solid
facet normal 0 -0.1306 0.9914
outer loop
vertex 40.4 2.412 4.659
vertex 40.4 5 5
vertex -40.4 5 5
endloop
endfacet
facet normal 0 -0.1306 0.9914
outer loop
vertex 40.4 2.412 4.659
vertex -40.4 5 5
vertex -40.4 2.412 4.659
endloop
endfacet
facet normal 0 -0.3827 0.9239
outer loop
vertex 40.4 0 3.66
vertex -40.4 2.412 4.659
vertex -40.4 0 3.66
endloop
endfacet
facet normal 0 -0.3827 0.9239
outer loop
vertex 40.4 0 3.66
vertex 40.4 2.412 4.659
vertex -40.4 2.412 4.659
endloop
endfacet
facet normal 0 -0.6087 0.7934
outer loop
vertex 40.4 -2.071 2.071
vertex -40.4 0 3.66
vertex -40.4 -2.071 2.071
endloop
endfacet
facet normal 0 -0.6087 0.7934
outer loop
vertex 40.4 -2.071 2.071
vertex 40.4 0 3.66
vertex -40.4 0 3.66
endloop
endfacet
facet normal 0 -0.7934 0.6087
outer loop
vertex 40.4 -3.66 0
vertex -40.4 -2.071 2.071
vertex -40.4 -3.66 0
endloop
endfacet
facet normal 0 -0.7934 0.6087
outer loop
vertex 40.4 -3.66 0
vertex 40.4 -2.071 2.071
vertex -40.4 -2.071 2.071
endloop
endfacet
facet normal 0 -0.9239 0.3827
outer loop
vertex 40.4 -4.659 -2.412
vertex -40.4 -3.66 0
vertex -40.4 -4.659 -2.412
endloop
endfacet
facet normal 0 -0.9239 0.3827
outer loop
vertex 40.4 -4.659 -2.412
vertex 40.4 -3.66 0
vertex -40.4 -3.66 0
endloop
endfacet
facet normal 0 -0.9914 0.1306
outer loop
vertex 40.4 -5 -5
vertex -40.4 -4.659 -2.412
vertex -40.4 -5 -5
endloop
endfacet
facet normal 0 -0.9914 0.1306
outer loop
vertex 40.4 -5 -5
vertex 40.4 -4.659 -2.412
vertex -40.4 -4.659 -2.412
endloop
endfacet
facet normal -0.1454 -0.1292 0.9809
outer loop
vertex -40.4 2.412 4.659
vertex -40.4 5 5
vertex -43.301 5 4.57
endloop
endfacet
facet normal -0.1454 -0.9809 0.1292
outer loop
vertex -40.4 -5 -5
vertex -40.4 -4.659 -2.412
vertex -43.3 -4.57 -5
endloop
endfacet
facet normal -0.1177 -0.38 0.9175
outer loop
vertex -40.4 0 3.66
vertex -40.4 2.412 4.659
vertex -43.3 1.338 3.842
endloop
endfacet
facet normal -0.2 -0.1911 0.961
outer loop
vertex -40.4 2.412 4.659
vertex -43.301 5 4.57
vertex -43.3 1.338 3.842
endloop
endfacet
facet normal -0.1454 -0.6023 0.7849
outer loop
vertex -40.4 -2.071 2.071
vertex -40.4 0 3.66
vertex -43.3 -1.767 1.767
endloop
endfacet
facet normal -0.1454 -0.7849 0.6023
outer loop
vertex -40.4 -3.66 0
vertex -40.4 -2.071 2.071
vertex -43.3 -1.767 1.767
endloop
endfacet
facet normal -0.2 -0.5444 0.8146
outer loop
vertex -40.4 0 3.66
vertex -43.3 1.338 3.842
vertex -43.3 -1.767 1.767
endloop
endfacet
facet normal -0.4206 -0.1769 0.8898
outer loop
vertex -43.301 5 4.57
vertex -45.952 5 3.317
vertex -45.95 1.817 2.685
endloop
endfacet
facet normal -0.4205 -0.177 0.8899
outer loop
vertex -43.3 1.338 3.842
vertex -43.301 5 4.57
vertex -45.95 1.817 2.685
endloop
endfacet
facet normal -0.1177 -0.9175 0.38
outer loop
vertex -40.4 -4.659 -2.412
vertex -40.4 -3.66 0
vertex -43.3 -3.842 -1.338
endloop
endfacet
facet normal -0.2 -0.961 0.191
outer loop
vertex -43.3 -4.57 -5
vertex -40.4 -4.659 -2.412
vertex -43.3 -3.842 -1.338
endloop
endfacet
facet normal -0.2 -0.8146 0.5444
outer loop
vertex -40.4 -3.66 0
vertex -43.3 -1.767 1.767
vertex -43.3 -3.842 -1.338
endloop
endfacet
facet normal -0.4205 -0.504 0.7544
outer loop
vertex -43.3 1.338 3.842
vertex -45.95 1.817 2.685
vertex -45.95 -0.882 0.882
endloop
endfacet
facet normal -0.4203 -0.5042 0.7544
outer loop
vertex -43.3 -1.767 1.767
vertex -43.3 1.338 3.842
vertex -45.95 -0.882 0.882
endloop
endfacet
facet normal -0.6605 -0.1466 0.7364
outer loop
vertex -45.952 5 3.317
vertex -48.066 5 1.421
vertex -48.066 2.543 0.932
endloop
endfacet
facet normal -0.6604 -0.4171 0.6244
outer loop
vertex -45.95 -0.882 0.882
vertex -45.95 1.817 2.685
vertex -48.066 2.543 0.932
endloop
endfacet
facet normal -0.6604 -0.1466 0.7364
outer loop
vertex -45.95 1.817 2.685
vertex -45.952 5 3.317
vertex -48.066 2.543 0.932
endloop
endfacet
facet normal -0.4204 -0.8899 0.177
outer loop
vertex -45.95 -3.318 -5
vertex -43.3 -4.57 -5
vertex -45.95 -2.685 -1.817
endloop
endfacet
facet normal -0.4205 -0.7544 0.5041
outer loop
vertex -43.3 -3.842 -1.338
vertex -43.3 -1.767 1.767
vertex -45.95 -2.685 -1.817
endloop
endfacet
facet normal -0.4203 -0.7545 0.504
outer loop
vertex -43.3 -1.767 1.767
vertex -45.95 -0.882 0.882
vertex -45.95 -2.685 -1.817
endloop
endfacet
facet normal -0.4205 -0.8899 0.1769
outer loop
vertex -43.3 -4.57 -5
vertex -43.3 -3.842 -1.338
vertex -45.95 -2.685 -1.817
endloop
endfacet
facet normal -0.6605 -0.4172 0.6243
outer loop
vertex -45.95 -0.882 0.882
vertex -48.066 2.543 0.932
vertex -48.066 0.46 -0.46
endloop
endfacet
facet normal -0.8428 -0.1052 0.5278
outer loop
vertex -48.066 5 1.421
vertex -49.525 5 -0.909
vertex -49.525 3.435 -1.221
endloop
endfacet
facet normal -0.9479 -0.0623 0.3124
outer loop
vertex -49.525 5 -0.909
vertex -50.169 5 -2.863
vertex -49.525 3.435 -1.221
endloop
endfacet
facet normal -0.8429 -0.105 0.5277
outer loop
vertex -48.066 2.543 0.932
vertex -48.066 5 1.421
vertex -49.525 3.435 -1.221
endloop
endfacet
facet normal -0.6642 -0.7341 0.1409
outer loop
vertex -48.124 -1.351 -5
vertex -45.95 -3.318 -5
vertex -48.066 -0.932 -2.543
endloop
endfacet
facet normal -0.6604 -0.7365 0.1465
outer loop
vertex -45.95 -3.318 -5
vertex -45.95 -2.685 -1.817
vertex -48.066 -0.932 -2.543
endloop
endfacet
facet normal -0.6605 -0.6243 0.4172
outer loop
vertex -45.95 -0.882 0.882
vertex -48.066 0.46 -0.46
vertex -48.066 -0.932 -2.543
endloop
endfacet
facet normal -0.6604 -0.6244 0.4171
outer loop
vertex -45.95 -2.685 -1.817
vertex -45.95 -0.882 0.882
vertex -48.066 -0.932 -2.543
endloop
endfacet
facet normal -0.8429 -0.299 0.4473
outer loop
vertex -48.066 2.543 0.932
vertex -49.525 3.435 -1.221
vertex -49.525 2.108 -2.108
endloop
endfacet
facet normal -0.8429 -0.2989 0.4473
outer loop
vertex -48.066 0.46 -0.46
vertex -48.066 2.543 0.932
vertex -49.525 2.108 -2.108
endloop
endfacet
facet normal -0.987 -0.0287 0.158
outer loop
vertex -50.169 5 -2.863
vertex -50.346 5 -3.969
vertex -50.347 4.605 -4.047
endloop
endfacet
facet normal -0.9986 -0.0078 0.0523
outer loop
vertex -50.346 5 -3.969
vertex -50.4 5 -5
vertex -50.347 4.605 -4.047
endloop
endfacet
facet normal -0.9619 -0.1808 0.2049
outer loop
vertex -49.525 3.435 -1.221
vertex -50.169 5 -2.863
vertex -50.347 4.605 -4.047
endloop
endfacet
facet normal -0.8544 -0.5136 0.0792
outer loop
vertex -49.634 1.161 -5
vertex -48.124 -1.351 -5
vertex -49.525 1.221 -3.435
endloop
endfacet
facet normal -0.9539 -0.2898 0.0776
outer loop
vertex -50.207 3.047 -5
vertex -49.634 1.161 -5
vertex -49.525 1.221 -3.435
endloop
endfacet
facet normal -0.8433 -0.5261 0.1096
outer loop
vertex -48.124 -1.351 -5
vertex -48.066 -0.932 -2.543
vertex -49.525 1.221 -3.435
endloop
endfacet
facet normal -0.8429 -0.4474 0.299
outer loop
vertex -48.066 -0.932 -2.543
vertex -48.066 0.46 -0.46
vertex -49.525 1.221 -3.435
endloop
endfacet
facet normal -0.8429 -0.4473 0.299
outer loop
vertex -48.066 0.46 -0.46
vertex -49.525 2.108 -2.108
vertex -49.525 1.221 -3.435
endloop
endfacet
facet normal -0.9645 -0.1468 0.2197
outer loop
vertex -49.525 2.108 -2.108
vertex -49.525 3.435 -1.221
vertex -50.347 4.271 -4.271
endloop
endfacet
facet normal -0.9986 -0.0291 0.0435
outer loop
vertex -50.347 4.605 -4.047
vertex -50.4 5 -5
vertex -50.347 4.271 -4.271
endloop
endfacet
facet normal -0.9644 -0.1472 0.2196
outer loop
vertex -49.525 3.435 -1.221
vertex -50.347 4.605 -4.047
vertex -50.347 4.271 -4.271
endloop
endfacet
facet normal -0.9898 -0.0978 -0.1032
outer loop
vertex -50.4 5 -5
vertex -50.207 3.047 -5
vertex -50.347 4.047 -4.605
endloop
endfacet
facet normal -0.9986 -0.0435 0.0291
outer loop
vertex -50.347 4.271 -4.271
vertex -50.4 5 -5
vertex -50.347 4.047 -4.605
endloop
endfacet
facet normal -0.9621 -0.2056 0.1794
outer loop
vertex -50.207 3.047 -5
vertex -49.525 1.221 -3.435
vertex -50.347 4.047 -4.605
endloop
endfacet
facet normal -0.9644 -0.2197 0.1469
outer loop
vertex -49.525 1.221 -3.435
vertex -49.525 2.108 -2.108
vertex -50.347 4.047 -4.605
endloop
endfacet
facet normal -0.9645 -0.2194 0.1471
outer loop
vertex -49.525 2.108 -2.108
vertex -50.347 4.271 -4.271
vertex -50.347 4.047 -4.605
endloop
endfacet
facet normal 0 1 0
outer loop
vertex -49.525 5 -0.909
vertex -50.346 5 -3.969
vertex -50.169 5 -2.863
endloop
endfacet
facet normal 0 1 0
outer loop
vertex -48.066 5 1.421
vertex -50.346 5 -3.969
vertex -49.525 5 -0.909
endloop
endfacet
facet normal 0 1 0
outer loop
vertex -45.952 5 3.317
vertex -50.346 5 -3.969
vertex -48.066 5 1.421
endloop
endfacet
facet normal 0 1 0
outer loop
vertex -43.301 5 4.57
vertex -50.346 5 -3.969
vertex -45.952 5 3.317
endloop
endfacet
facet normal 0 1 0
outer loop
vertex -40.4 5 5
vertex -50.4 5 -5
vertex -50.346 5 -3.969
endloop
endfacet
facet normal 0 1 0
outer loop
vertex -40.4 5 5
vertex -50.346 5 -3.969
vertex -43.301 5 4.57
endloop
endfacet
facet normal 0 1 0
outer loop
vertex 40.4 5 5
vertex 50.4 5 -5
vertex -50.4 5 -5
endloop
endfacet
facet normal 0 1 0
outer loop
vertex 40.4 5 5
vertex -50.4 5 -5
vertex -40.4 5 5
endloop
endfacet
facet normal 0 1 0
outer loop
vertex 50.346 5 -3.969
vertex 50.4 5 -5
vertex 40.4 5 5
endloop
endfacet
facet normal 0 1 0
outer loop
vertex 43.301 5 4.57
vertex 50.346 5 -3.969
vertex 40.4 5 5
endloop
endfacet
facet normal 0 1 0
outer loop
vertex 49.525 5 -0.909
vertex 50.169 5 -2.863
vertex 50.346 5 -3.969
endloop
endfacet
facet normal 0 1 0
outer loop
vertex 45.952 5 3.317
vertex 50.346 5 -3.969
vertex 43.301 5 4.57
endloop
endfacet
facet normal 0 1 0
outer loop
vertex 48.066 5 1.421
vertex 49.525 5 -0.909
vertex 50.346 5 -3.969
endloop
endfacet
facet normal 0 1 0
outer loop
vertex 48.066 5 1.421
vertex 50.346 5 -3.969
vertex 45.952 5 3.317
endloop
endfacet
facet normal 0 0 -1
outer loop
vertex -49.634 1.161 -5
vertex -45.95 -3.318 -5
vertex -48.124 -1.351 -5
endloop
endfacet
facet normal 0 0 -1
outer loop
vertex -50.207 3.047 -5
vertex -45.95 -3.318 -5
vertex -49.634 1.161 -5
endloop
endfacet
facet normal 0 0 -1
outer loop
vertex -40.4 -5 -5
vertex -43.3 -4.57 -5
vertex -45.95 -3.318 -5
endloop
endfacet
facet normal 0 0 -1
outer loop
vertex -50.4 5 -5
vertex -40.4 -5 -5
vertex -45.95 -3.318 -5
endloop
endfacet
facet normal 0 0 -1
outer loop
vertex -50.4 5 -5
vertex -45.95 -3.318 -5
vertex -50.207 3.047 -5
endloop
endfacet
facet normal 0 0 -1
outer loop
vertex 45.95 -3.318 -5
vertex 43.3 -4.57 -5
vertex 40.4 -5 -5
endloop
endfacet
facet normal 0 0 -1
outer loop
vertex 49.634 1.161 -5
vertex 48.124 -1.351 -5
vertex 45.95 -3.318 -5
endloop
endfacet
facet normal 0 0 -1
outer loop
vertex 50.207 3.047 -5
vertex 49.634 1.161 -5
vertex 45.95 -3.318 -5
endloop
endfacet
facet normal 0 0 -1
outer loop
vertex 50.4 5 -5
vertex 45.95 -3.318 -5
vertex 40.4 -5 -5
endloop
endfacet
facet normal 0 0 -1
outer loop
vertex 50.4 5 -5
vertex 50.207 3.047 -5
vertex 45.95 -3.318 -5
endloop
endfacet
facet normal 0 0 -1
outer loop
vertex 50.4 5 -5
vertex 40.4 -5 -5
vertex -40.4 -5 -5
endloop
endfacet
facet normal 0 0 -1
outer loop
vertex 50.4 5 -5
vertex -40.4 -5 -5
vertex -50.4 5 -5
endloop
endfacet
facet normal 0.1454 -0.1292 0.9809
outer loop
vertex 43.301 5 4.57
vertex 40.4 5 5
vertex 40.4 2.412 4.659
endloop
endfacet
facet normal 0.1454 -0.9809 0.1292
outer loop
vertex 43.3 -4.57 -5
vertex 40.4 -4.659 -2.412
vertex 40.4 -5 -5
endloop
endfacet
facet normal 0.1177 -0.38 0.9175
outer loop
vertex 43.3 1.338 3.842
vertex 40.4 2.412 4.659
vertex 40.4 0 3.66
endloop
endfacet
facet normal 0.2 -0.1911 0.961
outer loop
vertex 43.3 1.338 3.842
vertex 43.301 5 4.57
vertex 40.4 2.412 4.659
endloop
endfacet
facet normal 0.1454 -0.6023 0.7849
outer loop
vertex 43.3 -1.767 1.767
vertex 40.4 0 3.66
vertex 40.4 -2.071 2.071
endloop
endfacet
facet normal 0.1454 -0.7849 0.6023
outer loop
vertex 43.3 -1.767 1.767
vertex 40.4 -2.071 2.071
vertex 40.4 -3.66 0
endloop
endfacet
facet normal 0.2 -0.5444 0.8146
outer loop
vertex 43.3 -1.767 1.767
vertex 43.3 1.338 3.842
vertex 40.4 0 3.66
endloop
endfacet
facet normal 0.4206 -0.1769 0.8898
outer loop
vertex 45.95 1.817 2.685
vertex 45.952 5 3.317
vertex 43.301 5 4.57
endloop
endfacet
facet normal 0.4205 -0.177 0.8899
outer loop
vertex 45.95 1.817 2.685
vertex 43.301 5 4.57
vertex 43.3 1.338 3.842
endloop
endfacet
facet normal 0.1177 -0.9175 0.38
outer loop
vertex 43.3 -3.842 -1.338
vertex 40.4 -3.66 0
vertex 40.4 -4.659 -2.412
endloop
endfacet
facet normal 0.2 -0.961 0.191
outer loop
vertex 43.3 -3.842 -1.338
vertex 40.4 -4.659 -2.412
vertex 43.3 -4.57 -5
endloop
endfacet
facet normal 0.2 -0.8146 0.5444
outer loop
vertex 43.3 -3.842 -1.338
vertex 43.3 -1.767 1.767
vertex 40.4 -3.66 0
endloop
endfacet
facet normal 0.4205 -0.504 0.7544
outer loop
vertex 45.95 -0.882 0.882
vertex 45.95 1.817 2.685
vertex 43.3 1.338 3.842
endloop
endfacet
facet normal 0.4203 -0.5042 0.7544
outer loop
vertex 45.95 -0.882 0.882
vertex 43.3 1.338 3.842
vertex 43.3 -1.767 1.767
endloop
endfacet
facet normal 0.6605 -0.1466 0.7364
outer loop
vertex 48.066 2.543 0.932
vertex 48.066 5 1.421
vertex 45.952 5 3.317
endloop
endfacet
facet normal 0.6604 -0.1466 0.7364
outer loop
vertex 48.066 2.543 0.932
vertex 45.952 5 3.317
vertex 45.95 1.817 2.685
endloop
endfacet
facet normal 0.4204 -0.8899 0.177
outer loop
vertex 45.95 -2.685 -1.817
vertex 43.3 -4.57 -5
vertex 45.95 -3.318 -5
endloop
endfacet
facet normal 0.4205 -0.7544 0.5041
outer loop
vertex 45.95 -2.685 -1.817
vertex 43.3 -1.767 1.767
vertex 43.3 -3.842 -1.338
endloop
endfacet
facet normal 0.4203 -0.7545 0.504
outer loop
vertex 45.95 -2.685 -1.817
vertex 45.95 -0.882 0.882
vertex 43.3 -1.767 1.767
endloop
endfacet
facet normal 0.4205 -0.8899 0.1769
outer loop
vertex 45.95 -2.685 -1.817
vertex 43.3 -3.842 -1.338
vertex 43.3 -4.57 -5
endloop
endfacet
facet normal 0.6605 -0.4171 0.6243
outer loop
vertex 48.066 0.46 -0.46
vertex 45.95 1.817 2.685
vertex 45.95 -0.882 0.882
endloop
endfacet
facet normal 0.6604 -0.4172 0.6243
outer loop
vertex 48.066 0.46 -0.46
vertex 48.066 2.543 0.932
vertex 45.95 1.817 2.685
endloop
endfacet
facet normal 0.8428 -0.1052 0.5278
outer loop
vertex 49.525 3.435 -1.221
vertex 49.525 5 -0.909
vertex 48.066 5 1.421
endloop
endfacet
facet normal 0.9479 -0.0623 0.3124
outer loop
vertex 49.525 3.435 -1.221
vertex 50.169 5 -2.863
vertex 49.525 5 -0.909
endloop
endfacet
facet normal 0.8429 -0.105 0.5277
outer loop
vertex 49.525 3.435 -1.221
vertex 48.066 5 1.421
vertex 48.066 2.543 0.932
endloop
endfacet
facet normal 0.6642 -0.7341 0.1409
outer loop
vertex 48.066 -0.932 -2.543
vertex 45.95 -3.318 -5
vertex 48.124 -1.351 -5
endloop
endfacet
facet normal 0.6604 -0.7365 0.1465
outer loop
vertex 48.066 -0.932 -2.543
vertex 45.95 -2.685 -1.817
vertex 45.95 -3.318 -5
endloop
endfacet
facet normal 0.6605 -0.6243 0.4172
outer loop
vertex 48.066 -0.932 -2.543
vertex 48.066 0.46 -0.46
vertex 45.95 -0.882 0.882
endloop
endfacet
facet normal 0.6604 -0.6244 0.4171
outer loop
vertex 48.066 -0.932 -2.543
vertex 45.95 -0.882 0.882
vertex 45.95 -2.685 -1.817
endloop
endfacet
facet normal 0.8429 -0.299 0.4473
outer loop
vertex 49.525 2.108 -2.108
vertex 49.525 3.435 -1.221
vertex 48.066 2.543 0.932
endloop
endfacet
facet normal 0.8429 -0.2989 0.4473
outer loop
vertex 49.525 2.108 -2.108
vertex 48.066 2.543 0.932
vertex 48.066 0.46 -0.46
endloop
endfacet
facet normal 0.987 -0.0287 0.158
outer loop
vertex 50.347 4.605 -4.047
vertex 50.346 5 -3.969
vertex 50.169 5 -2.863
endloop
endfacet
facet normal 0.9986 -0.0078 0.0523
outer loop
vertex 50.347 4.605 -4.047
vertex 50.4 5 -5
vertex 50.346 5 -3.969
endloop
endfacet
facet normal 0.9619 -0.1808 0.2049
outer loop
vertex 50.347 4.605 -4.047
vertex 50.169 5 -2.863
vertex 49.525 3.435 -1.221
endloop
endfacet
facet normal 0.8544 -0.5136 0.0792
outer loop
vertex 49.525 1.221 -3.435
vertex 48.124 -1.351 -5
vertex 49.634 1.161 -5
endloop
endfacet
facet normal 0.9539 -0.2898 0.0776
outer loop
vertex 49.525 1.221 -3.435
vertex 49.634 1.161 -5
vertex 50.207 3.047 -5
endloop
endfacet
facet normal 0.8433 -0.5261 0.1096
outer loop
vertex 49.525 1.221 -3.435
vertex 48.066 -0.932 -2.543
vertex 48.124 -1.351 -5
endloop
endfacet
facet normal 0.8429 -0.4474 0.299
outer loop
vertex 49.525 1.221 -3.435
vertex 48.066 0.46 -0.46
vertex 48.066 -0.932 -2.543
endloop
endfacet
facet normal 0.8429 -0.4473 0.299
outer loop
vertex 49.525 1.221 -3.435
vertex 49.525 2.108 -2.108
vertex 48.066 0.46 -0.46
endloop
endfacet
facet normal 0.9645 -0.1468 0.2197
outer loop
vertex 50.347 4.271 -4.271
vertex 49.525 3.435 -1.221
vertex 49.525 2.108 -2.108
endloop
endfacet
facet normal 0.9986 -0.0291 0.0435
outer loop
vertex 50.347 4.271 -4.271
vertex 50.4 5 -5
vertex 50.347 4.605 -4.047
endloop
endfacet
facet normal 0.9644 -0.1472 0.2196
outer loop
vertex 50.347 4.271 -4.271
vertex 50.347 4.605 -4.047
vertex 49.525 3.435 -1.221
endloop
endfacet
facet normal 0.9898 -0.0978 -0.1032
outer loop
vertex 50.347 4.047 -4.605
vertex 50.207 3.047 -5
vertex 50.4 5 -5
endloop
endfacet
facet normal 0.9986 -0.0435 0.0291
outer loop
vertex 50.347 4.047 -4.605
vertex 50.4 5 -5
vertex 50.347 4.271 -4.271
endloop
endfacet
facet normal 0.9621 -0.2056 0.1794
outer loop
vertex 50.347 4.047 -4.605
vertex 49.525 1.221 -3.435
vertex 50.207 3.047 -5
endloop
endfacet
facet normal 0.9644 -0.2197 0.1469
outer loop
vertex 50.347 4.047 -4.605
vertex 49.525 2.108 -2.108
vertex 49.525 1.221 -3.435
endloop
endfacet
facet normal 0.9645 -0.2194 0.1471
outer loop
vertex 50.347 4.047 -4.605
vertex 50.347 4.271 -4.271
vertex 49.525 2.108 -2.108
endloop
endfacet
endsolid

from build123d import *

# Parameters (mm, degrees)
F1_DEPTH = 50.4
F2_R     = 9.99999


# Not quite as in the source:
# - a fillet or chamfer is up to 0.001 mm smaller than in the source, because OpenCascade refuses the exact size


with BuildPart() as f1:
    # F0 (on Right) → F1 (new body, symmetric)
    with BuildSketch(Plane.YZ):
        with BuildLine():
            Line((-5, -5), (5, -5))
            Line((5, -5), (5, 5))
            ThreePointArc((5, 5), (-2.0710678119, 2.0710678119), (-5, -5))
        make_face()
    extrude(amount=F1_DEPTH, both=True)

    # F2 (radius 10 in the source; OpenCascade refuses exactly that, so slightly less here)
    f2_edges = [f1.edges().sort_by_distance(p)[0] for p in [
        (50.4, -2.071068, 2.071068),
        (-50.4, -2.071068, 2.071068),
    ]]
    fillet(f2_edges, radius=F2_R)


solid = f1.part
